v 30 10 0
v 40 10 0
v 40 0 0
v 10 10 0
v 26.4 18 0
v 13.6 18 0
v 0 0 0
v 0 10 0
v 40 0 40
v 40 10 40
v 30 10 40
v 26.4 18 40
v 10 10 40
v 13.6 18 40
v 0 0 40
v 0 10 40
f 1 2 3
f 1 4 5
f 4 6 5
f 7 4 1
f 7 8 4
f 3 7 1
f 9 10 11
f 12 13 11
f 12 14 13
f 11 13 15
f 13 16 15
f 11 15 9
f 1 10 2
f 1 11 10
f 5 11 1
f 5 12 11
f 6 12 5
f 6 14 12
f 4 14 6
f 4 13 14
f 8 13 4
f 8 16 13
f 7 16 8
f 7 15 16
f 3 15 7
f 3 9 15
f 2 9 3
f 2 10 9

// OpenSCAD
$fn = 32;

// ----------------------------------------------------------------------
// V guide rail: dovetail, 40 mm wide
// ----------------------------------------------------------------------

// --- parameters (mm) ---
rail_w = 40;              // rail width, X
base_t = 10;              // base plate thickness
v_depth = 8;              // V feature depth / height
v_half_w = 10;            // half width of the V at the base face
plate_t = 40;             // rail length, Z (the extrusion height)
top_half_w = 6.4;         // half width at the dovetail top

dovetail_base = 2 * v_half_w;  // dovetail width at the base
dovetail_top = 2 * top_half_w;  // dovetail width at the top

profile = [[0, 0], [40, 0], [40, 10], [30, 10], [26.4, 18], [13.6, 18], [10, 10], [0, 10]];  // primary outline, 8 points, counter clockwise

// --- the one profile operation ---
linear_extrude(height = plate_t) polygon(points = profile);
